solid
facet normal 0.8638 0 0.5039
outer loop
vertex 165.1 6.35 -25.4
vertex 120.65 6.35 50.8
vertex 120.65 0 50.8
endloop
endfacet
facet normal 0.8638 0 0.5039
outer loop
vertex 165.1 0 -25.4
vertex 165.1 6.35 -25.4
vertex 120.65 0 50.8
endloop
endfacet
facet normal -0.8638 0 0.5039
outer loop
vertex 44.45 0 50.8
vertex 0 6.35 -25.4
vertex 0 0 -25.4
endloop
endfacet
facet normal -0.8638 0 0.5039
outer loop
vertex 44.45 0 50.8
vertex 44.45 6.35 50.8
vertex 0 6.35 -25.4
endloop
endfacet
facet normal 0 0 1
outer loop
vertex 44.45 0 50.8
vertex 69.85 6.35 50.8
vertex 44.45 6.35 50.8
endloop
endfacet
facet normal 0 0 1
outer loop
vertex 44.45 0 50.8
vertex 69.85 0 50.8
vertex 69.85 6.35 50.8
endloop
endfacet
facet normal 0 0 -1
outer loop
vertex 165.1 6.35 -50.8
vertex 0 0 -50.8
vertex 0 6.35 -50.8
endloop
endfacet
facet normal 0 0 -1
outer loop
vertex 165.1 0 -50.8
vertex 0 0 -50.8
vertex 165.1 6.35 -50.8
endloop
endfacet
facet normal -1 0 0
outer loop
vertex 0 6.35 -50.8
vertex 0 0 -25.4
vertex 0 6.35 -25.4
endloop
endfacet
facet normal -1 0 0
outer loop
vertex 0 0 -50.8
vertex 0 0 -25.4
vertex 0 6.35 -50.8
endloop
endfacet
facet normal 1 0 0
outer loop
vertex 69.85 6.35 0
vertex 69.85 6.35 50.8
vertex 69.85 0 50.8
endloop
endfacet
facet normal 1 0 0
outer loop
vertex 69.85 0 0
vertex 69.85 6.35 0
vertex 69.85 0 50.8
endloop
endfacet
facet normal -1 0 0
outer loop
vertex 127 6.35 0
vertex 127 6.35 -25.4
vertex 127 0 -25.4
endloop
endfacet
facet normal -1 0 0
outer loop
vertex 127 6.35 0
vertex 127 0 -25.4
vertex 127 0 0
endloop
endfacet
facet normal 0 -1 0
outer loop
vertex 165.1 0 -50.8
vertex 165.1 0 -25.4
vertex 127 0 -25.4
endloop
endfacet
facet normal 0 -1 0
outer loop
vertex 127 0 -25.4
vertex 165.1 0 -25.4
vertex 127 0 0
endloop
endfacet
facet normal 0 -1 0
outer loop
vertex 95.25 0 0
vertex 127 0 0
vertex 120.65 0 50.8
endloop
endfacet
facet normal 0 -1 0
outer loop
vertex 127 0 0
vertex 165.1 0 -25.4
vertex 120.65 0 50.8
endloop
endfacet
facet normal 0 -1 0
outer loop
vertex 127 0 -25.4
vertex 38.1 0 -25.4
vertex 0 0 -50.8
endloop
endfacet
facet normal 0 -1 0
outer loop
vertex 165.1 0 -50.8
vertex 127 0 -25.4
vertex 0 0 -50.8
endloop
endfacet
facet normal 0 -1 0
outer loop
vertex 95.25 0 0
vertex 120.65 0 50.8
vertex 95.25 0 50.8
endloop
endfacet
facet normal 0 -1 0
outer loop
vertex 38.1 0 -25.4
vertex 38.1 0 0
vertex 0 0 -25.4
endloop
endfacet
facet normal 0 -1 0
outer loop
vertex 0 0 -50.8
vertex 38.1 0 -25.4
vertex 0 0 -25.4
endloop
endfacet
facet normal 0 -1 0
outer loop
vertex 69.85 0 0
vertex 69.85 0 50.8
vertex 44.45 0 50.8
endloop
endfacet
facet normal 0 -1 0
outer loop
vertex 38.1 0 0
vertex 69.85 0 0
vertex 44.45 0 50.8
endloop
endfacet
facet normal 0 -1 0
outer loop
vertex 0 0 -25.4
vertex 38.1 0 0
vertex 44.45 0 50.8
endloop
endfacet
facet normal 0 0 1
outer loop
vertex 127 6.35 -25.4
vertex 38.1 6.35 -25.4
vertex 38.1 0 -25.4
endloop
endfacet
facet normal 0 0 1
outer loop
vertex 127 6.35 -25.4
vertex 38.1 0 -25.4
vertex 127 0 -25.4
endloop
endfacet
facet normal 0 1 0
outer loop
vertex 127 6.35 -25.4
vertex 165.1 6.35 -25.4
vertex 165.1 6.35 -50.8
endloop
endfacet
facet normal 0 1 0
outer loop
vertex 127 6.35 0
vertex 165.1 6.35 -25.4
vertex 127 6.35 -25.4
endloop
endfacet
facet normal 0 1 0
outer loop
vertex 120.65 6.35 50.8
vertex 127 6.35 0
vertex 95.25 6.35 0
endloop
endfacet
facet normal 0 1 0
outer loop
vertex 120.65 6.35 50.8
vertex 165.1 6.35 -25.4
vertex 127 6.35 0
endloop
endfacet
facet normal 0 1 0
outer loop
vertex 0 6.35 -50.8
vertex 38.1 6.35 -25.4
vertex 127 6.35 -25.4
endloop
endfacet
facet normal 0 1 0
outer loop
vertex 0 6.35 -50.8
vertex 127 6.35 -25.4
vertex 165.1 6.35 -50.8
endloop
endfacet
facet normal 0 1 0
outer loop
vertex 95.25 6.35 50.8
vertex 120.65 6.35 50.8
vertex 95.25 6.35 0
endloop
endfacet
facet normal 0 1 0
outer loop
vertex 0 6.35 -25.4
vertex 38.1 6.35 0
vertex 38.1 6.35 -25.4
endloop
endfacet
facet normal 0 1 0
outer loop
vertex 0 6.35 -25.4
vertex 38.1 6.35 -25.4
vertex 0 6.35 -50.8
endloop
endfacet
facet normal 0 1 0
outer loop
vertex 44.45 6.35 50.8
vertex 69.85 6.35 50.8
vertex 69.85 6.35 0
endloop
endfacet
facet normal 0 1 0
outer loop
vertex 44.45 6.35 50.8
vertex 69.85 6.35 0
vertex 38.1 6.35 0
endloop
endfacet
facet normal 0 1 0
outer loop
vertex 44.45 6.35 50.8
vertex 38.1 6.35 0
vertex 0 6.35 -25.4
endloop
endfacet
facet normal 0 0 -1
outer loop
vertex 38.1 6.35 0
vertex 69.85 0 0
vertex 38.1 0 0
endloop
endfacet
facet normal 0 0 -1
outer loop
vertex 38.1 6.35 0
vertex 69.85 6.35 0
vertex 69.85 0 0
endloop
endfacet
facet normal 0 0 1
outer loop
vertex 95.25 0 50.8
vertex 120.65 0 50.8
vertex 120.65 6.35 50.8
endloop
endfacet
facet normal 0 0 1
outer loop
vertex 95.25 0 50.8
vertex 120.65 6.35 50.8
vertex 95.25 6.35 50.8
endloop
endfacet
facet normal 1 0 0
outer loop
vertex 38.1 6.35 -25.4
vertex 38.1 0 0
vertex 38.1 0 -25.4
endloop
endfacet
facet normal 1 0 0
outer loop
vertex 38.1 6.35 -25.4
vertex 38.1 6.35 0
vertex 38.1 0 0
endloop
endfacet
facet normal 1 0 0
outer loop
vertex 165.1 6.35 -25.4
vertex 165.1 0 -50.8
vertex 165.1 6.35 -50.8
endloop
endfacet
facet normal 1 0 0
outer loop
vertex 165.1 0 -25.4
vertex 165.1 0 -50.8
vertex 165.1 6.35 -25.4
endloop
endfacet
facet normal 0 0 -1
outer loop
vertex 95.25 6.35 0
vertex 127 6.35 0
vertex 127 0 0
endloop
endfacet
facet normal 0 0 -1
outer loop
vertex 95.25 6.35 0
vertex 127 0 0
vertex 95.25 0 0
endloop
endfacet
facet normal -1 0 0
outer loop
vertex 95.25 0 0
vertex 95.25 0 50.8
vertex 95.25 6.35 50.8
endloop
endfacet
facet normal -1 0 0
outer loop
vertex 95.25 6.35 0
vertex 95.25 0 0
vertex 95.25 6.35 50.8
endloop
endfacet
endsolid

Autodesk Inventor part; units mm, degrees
sketch "Sketch1" plane through (0, 0, 0) normal (0, 1, 0) x (-1, 0, 0)
  line L0 (0, -50.8) -> (-165.1, -50.8)
  line L1 (-165.1, -50.8) -> (-165.1, 50.8)
  line L2 (-165.1, 50.8) -> (0, 50.8)
  line L3 (0, 50.8) -> (0, -50.8)
  line L4 (0, -71.12) -> (0, 71.12) projected
  line L5 (-198.12, 0) -> (33.02, 0) projected
  point P0 (0, 0)
  dimension "d0" = 0
  dimension "d1" = 101.6
  dimension "d2" = 50.8
  dimension "d3" = 165.1
extrude "Extrusion1" add sketch "Sketch1" along normal blind 6.35
chamfer "Chamfer1" distance 76.2 distance2 44.45 1 edges at (0, 3.175, 50.8) measured on face at (0, 2.1167, -16.9333)
chamfer "Chamfer2" distance 44.45 distance2 76.2 1 edges at (165.1, 3.175, 50.8) measured on face at (84.6667, 2.1167, 50.8)
sketch "Sketch2" plane through (0, 6.35, 0) normal (0, 1, 0) x (1, 0, 0)
  line L0 (38.1, 25.4) -> (127, 25.4)
  line L1 (127, 25.4) -> (127, 0)
  line L2 (127, 0) -> (38.1, 0)
  line L3 (38.1, 0) -> (38.1, 25.4)
  line L4 (165.1, 50.8) -> (0, 50.8) projected
  line L5 (0, 50.8) -> (0, 25.4) projected
  point P0 (0, 0)
  point P1 (38.1, 12.7)
  dimension "d12" = 25.4
  dimension "d13" = 25.4
  dimension "d14" = 88.9
  dimension "d15" = 38.1
extrude "Extrusion2" cut sketch "Sketch2" against normal up to surface (6.35 mm away)
sketch "Sketch3" plane through (44.45, 0, 50.8) normal (0, 0, 1) x (1, 0, 0)
  line L0 (120.65, 6.35) -> (-44.45, 6.35) projected
  line L1 (25.4, 6.35) -> (25.4, 0)
  line L2 (25.4, 0) -> (50.8, 0)
  line L3 (50.8, 0) -> (50.8, 6.35)
  line L4 (-44.45, 7.62) -> (-44.45, -1.27) projected
  point P0 (-44.45, 0)
  dimension "d18" = 25.4
  dimension "d19" = 69.85
sketch "Sketch4" plane through (127, 6.35, 0) normal (0, 0, -1) x (-1, 0, 0)
  line L0 (88.9, -6.35) -> (0, -6.35) projected
  line L1 (88.9, 0) -> (88.9, -6.35) projected
  line L2 (0, 0) -> (88.9, 0) projected
  line L3 (0, 0) -> (0, -6.35) projected
  line L4 (31.75, -6.35) -> (31.75, 0) projected
  line L5 (57.15, 0) -> (57.15, -6.35) projected
  point P0 (127, -6.35)
extrude "Extrusion3" cut sketch "Sketch4" against normal up to next contours L0 L4 L2 L5
equation "\"d2\" = 0.5 * d1"
properties part number "chap3ex1"
